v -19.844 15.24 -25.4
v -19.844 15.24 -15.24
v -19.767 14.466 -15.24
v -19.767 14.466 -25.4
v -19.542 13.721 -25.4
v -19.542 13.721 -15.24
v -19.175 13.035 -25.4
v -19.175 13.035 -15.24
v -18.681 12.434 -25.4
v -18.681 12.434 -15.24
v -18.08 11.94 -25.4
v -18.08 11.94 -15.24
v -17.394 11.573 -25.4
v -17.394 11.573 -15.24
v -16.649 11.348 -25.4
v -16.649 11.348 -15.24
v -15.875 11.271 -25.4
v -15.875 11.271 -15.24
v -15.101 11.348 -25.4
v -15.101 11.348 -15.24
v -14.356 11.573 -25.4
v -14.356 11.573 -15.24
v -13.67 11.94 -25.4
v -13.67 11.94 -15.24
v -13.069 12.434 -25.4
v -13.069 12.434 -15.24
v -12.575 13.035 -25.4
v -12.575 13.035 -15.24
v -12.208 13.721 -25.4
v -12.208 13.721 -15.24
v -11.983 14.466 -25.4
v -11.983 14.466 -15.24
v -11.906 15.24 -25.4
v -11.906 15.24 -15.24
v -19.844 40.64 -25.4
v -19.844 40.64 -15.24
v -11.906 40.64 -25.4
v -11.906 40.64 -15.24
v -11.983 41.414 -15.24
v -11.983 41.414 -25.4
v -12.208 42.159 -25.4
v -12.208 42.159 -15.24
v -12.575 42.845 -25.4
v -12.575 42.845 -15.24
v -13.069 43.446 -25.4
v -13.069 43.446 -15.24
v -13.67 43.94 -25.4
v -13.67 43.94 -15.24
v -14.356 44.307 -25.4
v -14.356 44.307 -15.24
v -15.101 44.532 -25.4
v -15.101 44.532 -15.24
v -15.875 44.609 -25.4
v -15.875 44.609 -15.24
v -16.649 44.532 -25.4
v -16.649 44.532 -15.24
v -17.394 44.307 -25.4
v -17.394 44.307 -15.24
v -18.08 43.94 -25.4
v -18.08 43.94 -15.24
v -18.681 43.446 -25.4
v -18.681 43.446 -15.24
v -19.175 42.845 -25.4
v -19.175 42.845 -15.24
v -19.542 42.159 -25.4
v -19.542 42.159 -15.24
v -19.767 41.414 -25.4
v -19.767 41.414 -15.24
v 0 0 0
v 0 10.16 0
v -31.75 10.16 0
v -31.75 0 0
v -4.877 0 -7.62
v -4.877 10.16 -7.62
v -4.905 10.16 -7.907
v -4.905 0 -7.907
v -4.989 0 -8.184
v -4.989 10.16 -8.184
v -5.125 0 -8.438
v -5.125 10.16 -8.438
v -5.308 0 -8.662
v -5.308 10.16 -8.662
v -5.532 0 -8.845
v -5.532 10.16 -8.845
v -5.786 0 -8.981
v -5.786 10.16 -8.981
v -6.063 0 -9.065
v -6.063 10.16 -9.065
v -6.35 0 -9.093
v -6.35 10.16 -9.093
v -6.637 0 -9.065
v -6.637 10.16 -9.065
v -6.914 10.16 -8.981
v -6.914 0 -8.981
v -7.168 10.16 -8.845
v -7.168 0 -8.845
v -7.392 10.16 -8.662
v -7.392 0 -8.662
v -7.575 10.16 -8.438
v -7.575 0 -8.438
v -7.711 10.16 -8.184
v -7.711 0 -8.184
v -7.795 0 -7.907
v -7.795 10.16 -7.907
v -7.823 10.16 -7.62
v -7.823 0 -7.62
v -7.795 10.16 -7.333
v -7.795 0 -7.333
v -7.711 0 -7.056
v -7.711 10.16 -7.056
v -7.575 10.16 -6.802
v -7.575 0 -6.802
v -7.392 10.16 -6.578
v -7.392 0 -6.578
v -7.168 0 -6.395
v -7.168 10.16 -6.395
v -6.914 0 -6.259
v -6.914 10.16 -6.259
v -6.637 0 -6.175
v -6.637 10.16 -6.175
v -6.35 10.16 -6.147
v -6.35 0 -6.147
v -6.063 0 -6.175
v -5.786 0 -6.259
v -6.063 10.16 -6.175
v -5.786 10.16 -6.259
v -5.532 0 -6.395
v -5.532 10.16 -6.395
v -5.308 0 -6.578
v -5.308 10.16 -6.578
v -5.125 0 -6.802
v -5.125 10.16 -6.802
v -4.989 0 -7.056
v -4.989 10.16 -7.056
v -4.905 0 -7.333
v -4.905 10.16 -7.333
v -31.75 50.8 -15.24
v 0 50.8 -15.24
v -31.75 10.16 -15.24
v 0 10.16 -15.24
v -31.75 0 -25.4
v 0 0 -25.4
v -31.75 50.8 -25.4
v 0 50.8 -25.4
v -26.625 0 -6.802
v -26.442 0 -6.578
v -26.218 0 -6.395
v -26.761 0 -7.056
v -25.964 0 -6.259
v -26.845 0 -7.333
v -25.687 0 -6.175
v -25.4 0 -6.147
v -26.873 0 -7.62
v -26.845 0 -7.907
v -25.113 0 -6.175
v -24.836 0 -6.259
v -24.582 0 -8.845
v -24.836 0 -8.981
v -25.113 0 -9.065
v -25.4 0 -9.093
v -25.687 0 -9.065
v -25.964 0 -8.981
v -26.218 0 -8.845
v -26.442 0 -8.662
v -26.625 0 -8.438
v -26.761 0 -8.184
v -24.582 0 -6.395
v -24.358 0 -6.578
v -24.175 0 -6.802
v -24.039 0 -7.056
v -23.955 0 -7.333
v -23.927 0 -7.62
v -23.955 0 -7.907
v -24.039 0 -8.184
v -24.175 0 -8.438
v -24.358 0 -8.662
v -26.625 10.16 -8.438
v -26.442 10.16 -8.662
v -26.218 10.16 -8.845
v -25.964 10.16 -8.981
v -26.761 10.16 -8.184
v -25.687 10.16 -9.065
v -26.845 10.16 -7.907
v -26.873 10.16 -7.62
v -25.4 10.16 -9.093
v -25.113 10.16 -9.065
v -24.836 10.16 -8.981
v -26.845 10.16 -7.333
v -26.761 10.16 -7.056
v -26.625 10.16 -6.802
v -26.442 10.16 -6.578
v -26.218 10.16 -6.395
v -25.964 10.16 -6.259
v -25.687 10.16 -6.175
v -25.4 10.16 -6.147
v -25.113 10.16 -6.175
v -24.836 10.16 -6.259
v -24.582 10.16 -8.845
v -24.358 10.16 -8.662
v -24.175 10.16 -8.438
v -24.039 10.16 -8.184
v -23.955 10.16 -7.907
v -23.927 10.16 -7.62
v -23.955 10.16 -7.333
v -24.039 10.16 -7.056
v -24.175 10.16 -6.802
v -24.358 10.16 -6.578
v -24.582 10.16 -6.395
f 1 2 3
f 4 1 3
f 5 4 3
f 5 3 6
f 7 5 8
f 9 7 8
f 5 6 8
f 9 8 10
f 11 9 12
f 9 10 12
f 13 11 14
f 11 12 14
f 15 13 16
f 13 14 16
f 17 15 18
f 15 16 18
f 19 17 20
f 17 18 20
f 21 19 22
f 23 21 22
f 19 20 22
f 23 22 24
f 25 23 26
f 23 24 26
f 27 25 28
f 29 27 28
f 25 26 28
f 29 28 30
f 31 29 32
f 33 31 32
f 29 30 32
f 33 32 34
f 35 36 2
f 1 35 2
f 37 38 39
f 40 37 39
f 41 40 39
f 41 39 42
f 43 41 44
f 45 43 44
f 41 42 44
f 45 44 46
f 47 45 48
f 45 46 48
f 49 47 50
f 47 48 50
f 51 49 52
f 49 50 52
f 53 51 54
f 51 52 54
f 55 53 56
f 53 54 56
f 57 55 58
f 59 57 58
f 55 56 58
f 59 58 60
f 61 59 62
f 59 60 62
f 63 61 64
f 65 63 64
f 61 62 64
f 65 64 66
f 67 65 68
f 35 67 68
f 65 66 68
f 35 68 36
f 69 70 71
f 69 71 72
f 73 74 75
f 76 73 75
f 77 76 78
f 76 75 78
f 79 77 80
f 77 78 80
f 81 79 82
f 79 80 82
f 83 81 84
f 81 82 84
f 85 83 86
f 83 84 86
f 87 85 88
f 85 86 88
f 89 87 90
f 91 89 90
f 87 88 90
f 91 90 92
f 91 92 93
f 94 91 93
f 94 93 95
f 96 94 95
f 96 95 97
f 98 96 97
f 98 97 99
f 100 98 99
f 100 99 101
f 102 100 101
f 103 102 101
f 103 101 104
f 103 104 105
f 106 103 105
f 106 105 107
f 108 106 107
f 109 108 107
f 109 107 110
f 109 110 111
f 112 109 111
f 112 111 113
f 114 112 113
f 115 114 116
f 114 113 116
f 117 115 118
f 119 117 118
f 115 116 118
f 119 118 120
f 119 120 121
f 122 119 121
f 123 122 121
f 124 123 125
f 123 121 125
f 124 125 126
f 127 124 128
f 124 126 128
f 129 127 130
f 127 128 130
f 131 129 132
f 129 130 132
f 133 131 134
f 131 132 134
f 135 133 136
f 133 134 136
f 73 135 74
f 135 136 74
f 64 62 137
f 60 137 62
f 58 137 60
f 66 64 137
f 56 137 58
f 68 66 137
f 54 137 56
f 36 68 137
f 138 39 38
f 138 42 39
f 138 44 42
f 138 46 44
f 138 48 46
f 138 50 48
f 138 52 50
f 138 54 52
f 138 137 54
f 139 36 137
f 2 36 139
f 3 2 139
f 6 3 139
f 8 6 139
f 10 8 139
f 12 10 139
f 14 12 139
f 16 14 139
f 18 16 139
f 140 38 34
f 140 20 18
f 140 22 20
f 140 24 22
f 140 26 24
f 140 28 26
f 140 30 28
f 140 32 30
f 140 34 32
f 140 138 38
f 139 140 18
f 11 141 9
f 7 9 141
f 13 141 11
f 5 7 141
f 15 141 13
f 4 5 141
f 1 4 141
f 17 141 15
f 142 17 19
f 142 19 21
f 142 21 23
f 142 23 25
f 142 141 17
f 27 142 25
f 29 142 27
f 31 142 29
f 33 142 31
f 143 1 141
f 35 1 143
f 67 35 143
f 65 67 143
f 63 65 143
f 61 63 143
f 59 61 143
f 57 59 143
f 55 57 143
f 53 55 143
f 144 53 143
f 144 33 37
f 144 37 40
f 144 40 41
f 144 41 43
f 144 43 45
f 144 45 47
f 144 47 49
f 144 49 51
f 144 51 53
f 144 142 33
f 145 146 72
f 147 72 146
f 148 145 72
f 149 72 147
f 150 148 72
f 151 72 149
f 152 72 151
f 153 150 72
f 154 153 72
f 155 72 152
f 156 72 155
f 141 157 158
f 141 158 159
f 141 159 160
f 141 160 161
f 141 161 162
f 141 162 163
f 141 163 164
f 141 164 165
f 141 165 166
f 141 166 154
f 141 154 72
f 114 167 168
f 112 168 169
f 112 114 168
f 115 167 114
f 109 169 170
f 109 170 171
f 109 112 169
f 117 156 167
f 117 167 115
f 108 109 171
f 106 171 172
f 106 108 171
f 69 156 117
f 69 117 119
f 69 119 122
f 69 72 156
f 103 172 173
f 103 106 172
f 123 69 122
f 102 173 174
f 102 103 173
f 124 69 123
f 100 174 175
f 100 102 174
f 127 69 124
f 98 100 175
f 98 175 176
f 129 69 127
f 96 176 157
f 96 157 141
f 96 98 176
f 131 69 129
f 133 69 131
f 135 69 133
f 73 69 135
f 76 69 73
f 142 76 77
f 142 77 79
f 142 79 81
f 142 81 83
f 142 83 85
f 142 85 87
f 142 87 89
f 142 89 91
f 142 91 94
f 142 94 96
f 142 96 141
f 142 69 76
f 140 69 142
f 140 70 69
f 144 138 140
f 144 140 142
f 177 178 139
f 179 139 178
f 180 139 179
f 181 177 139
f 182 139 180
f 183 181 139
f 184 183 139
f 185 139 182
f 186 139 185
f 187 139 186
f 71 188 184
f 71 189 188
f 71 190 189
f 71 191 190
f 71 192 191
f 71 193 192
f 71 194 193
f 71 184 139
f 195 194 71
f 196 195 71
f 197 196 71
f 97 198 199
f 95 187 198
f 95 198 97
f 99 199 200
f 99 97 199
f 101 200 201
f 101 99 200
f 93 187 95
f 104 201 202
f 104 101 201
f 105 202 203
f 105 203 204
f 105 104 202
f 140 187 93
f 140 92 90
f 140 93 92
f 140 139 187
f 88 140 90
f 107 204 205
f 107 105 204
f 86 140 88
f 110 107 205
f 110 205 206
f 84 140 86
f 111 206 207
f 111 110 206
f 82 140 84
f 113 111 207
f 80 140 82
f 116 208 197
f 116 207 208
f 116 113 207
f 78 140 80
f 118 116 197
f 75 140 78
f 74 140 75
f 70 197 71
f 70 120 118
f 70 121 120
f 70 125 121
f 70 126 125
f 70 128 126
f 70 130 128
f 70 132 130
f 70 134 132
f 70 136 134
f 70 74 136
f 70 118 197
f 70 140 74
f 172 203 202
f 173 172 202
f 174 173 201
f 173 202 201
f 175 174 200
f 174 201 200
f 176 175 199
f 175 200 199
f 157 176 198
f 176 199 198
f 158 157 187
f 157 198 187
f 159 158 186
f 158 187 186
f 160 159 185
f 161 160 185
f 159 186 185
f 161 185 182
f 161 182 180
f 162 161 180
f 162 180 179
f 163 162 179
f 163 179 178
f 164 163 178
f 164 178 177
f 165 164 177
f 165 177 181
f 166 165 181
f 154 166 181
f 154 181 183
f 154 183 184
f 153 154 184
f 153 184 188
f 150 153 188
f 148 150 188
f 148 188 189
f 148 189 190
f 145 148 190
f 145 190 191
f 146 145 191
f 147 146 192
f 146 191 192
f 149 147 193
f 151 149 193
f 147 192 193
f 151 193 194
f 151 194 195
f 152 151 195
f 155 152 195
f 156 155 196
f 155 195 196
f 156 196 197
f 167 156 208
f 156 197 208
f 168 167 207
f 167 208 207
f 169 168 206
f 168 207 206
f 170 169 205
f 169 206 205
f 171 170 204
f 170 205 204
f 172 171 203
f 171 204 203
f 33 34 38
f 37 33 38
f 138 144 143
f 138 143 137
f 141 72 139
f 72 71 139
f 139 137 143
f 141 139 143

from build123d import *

# Parameters (mm, degrees)
BOSS_EXTRUDE1_DEPTH = 31.75
CUT_EXTRUDE1_DEPTH  = 11.16
SKETCH5_R           = 1.4732
CUT_EXTRUDE2_DEPTH  = 11.16


with BuildPart() as part:
    # Sketch3 → Boss-Extrude1 (new body)
    with BuildSketch(Plane(origin=(0, 0, 0), x_dir=(0, 0, -1), z_dir=(1, 0, 0))):
        Polygon((0, 0), (25.4, 0), (25.4, 50.8), (15.24, 50.8), (15.24, 10.16), (0, 10.16), align=None)
    extrude(amount=-BOSS_EXTRUDE1_DEPTH)

    # Sketch4 → Cut-Extrude1 (cut, through all)
    with BuildSketch(Plane.XY.offset(-15.24)):
        with BuildLine():
            Line((-19.84375, 40.64), (-19.84375, 15.24))
            ThreePointArc((-19.84375, 15.24), (-15.875, 11.27125), (-11.90625, 15.24))
            Line((-11.90625, 15.24), (-11.90625, 40.64))
            ThreePointArc((-11.90625, 40.64), (-15.875, 44.60875), (-19.84375, 40.64))
        make_face()
    extrude(amount=-CUT_EXTRUDE1_DEPTH, mode=Mode.SUBTRACT)

    # Sketch5 → Cut-Extrude2 (cut, through all)
    with BuildSketch(Plane(origin=(0, 10.16, 0), x_dir=(1, 0, 0), z_dir=(0, 1, 0))):
        with Locations((-25.4, 7.62)):
            Circle(SKETCH5_R)
        with Locations((-6.35, 7.62)):
            Circle(SKETCH5_R)
    extrude(amount=-CUT_EXTRUDE2_DEPTH, mode=Mode.SUBTRACT)


solid = part.part
